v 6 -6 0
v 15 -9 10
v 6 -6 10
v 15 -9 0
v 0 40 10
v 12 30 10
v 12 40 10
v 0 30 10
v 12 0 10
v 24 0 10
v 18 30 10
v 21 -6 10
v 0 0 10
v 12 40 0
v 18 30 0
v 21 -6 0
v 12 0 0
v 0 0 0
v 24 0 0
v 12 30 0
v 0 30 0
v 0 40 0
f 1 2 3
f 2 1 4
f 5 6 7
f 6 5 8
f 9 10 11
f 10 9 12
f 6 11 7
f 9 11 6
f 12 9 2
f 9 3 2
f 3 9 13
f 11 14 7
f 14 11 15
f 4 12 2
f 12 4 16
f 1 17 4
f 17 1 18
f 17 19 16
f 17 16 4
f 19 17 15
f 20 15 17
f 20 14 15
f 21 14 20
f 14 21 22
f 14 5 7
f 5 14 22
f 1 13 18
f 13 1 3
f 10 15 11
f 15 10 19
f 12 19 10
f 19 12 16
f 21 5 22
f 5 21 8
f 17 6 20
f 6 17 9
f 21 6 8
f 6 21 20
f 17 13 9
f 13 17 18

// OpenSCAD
difference () {
linear_extrude(height = 10) polygon( points=[[0,0],[6,-6],[15,-9],[21,-6],[24,0],[18,30],[12,40],[0,40]] );
cube ([12,30,12]);
}
